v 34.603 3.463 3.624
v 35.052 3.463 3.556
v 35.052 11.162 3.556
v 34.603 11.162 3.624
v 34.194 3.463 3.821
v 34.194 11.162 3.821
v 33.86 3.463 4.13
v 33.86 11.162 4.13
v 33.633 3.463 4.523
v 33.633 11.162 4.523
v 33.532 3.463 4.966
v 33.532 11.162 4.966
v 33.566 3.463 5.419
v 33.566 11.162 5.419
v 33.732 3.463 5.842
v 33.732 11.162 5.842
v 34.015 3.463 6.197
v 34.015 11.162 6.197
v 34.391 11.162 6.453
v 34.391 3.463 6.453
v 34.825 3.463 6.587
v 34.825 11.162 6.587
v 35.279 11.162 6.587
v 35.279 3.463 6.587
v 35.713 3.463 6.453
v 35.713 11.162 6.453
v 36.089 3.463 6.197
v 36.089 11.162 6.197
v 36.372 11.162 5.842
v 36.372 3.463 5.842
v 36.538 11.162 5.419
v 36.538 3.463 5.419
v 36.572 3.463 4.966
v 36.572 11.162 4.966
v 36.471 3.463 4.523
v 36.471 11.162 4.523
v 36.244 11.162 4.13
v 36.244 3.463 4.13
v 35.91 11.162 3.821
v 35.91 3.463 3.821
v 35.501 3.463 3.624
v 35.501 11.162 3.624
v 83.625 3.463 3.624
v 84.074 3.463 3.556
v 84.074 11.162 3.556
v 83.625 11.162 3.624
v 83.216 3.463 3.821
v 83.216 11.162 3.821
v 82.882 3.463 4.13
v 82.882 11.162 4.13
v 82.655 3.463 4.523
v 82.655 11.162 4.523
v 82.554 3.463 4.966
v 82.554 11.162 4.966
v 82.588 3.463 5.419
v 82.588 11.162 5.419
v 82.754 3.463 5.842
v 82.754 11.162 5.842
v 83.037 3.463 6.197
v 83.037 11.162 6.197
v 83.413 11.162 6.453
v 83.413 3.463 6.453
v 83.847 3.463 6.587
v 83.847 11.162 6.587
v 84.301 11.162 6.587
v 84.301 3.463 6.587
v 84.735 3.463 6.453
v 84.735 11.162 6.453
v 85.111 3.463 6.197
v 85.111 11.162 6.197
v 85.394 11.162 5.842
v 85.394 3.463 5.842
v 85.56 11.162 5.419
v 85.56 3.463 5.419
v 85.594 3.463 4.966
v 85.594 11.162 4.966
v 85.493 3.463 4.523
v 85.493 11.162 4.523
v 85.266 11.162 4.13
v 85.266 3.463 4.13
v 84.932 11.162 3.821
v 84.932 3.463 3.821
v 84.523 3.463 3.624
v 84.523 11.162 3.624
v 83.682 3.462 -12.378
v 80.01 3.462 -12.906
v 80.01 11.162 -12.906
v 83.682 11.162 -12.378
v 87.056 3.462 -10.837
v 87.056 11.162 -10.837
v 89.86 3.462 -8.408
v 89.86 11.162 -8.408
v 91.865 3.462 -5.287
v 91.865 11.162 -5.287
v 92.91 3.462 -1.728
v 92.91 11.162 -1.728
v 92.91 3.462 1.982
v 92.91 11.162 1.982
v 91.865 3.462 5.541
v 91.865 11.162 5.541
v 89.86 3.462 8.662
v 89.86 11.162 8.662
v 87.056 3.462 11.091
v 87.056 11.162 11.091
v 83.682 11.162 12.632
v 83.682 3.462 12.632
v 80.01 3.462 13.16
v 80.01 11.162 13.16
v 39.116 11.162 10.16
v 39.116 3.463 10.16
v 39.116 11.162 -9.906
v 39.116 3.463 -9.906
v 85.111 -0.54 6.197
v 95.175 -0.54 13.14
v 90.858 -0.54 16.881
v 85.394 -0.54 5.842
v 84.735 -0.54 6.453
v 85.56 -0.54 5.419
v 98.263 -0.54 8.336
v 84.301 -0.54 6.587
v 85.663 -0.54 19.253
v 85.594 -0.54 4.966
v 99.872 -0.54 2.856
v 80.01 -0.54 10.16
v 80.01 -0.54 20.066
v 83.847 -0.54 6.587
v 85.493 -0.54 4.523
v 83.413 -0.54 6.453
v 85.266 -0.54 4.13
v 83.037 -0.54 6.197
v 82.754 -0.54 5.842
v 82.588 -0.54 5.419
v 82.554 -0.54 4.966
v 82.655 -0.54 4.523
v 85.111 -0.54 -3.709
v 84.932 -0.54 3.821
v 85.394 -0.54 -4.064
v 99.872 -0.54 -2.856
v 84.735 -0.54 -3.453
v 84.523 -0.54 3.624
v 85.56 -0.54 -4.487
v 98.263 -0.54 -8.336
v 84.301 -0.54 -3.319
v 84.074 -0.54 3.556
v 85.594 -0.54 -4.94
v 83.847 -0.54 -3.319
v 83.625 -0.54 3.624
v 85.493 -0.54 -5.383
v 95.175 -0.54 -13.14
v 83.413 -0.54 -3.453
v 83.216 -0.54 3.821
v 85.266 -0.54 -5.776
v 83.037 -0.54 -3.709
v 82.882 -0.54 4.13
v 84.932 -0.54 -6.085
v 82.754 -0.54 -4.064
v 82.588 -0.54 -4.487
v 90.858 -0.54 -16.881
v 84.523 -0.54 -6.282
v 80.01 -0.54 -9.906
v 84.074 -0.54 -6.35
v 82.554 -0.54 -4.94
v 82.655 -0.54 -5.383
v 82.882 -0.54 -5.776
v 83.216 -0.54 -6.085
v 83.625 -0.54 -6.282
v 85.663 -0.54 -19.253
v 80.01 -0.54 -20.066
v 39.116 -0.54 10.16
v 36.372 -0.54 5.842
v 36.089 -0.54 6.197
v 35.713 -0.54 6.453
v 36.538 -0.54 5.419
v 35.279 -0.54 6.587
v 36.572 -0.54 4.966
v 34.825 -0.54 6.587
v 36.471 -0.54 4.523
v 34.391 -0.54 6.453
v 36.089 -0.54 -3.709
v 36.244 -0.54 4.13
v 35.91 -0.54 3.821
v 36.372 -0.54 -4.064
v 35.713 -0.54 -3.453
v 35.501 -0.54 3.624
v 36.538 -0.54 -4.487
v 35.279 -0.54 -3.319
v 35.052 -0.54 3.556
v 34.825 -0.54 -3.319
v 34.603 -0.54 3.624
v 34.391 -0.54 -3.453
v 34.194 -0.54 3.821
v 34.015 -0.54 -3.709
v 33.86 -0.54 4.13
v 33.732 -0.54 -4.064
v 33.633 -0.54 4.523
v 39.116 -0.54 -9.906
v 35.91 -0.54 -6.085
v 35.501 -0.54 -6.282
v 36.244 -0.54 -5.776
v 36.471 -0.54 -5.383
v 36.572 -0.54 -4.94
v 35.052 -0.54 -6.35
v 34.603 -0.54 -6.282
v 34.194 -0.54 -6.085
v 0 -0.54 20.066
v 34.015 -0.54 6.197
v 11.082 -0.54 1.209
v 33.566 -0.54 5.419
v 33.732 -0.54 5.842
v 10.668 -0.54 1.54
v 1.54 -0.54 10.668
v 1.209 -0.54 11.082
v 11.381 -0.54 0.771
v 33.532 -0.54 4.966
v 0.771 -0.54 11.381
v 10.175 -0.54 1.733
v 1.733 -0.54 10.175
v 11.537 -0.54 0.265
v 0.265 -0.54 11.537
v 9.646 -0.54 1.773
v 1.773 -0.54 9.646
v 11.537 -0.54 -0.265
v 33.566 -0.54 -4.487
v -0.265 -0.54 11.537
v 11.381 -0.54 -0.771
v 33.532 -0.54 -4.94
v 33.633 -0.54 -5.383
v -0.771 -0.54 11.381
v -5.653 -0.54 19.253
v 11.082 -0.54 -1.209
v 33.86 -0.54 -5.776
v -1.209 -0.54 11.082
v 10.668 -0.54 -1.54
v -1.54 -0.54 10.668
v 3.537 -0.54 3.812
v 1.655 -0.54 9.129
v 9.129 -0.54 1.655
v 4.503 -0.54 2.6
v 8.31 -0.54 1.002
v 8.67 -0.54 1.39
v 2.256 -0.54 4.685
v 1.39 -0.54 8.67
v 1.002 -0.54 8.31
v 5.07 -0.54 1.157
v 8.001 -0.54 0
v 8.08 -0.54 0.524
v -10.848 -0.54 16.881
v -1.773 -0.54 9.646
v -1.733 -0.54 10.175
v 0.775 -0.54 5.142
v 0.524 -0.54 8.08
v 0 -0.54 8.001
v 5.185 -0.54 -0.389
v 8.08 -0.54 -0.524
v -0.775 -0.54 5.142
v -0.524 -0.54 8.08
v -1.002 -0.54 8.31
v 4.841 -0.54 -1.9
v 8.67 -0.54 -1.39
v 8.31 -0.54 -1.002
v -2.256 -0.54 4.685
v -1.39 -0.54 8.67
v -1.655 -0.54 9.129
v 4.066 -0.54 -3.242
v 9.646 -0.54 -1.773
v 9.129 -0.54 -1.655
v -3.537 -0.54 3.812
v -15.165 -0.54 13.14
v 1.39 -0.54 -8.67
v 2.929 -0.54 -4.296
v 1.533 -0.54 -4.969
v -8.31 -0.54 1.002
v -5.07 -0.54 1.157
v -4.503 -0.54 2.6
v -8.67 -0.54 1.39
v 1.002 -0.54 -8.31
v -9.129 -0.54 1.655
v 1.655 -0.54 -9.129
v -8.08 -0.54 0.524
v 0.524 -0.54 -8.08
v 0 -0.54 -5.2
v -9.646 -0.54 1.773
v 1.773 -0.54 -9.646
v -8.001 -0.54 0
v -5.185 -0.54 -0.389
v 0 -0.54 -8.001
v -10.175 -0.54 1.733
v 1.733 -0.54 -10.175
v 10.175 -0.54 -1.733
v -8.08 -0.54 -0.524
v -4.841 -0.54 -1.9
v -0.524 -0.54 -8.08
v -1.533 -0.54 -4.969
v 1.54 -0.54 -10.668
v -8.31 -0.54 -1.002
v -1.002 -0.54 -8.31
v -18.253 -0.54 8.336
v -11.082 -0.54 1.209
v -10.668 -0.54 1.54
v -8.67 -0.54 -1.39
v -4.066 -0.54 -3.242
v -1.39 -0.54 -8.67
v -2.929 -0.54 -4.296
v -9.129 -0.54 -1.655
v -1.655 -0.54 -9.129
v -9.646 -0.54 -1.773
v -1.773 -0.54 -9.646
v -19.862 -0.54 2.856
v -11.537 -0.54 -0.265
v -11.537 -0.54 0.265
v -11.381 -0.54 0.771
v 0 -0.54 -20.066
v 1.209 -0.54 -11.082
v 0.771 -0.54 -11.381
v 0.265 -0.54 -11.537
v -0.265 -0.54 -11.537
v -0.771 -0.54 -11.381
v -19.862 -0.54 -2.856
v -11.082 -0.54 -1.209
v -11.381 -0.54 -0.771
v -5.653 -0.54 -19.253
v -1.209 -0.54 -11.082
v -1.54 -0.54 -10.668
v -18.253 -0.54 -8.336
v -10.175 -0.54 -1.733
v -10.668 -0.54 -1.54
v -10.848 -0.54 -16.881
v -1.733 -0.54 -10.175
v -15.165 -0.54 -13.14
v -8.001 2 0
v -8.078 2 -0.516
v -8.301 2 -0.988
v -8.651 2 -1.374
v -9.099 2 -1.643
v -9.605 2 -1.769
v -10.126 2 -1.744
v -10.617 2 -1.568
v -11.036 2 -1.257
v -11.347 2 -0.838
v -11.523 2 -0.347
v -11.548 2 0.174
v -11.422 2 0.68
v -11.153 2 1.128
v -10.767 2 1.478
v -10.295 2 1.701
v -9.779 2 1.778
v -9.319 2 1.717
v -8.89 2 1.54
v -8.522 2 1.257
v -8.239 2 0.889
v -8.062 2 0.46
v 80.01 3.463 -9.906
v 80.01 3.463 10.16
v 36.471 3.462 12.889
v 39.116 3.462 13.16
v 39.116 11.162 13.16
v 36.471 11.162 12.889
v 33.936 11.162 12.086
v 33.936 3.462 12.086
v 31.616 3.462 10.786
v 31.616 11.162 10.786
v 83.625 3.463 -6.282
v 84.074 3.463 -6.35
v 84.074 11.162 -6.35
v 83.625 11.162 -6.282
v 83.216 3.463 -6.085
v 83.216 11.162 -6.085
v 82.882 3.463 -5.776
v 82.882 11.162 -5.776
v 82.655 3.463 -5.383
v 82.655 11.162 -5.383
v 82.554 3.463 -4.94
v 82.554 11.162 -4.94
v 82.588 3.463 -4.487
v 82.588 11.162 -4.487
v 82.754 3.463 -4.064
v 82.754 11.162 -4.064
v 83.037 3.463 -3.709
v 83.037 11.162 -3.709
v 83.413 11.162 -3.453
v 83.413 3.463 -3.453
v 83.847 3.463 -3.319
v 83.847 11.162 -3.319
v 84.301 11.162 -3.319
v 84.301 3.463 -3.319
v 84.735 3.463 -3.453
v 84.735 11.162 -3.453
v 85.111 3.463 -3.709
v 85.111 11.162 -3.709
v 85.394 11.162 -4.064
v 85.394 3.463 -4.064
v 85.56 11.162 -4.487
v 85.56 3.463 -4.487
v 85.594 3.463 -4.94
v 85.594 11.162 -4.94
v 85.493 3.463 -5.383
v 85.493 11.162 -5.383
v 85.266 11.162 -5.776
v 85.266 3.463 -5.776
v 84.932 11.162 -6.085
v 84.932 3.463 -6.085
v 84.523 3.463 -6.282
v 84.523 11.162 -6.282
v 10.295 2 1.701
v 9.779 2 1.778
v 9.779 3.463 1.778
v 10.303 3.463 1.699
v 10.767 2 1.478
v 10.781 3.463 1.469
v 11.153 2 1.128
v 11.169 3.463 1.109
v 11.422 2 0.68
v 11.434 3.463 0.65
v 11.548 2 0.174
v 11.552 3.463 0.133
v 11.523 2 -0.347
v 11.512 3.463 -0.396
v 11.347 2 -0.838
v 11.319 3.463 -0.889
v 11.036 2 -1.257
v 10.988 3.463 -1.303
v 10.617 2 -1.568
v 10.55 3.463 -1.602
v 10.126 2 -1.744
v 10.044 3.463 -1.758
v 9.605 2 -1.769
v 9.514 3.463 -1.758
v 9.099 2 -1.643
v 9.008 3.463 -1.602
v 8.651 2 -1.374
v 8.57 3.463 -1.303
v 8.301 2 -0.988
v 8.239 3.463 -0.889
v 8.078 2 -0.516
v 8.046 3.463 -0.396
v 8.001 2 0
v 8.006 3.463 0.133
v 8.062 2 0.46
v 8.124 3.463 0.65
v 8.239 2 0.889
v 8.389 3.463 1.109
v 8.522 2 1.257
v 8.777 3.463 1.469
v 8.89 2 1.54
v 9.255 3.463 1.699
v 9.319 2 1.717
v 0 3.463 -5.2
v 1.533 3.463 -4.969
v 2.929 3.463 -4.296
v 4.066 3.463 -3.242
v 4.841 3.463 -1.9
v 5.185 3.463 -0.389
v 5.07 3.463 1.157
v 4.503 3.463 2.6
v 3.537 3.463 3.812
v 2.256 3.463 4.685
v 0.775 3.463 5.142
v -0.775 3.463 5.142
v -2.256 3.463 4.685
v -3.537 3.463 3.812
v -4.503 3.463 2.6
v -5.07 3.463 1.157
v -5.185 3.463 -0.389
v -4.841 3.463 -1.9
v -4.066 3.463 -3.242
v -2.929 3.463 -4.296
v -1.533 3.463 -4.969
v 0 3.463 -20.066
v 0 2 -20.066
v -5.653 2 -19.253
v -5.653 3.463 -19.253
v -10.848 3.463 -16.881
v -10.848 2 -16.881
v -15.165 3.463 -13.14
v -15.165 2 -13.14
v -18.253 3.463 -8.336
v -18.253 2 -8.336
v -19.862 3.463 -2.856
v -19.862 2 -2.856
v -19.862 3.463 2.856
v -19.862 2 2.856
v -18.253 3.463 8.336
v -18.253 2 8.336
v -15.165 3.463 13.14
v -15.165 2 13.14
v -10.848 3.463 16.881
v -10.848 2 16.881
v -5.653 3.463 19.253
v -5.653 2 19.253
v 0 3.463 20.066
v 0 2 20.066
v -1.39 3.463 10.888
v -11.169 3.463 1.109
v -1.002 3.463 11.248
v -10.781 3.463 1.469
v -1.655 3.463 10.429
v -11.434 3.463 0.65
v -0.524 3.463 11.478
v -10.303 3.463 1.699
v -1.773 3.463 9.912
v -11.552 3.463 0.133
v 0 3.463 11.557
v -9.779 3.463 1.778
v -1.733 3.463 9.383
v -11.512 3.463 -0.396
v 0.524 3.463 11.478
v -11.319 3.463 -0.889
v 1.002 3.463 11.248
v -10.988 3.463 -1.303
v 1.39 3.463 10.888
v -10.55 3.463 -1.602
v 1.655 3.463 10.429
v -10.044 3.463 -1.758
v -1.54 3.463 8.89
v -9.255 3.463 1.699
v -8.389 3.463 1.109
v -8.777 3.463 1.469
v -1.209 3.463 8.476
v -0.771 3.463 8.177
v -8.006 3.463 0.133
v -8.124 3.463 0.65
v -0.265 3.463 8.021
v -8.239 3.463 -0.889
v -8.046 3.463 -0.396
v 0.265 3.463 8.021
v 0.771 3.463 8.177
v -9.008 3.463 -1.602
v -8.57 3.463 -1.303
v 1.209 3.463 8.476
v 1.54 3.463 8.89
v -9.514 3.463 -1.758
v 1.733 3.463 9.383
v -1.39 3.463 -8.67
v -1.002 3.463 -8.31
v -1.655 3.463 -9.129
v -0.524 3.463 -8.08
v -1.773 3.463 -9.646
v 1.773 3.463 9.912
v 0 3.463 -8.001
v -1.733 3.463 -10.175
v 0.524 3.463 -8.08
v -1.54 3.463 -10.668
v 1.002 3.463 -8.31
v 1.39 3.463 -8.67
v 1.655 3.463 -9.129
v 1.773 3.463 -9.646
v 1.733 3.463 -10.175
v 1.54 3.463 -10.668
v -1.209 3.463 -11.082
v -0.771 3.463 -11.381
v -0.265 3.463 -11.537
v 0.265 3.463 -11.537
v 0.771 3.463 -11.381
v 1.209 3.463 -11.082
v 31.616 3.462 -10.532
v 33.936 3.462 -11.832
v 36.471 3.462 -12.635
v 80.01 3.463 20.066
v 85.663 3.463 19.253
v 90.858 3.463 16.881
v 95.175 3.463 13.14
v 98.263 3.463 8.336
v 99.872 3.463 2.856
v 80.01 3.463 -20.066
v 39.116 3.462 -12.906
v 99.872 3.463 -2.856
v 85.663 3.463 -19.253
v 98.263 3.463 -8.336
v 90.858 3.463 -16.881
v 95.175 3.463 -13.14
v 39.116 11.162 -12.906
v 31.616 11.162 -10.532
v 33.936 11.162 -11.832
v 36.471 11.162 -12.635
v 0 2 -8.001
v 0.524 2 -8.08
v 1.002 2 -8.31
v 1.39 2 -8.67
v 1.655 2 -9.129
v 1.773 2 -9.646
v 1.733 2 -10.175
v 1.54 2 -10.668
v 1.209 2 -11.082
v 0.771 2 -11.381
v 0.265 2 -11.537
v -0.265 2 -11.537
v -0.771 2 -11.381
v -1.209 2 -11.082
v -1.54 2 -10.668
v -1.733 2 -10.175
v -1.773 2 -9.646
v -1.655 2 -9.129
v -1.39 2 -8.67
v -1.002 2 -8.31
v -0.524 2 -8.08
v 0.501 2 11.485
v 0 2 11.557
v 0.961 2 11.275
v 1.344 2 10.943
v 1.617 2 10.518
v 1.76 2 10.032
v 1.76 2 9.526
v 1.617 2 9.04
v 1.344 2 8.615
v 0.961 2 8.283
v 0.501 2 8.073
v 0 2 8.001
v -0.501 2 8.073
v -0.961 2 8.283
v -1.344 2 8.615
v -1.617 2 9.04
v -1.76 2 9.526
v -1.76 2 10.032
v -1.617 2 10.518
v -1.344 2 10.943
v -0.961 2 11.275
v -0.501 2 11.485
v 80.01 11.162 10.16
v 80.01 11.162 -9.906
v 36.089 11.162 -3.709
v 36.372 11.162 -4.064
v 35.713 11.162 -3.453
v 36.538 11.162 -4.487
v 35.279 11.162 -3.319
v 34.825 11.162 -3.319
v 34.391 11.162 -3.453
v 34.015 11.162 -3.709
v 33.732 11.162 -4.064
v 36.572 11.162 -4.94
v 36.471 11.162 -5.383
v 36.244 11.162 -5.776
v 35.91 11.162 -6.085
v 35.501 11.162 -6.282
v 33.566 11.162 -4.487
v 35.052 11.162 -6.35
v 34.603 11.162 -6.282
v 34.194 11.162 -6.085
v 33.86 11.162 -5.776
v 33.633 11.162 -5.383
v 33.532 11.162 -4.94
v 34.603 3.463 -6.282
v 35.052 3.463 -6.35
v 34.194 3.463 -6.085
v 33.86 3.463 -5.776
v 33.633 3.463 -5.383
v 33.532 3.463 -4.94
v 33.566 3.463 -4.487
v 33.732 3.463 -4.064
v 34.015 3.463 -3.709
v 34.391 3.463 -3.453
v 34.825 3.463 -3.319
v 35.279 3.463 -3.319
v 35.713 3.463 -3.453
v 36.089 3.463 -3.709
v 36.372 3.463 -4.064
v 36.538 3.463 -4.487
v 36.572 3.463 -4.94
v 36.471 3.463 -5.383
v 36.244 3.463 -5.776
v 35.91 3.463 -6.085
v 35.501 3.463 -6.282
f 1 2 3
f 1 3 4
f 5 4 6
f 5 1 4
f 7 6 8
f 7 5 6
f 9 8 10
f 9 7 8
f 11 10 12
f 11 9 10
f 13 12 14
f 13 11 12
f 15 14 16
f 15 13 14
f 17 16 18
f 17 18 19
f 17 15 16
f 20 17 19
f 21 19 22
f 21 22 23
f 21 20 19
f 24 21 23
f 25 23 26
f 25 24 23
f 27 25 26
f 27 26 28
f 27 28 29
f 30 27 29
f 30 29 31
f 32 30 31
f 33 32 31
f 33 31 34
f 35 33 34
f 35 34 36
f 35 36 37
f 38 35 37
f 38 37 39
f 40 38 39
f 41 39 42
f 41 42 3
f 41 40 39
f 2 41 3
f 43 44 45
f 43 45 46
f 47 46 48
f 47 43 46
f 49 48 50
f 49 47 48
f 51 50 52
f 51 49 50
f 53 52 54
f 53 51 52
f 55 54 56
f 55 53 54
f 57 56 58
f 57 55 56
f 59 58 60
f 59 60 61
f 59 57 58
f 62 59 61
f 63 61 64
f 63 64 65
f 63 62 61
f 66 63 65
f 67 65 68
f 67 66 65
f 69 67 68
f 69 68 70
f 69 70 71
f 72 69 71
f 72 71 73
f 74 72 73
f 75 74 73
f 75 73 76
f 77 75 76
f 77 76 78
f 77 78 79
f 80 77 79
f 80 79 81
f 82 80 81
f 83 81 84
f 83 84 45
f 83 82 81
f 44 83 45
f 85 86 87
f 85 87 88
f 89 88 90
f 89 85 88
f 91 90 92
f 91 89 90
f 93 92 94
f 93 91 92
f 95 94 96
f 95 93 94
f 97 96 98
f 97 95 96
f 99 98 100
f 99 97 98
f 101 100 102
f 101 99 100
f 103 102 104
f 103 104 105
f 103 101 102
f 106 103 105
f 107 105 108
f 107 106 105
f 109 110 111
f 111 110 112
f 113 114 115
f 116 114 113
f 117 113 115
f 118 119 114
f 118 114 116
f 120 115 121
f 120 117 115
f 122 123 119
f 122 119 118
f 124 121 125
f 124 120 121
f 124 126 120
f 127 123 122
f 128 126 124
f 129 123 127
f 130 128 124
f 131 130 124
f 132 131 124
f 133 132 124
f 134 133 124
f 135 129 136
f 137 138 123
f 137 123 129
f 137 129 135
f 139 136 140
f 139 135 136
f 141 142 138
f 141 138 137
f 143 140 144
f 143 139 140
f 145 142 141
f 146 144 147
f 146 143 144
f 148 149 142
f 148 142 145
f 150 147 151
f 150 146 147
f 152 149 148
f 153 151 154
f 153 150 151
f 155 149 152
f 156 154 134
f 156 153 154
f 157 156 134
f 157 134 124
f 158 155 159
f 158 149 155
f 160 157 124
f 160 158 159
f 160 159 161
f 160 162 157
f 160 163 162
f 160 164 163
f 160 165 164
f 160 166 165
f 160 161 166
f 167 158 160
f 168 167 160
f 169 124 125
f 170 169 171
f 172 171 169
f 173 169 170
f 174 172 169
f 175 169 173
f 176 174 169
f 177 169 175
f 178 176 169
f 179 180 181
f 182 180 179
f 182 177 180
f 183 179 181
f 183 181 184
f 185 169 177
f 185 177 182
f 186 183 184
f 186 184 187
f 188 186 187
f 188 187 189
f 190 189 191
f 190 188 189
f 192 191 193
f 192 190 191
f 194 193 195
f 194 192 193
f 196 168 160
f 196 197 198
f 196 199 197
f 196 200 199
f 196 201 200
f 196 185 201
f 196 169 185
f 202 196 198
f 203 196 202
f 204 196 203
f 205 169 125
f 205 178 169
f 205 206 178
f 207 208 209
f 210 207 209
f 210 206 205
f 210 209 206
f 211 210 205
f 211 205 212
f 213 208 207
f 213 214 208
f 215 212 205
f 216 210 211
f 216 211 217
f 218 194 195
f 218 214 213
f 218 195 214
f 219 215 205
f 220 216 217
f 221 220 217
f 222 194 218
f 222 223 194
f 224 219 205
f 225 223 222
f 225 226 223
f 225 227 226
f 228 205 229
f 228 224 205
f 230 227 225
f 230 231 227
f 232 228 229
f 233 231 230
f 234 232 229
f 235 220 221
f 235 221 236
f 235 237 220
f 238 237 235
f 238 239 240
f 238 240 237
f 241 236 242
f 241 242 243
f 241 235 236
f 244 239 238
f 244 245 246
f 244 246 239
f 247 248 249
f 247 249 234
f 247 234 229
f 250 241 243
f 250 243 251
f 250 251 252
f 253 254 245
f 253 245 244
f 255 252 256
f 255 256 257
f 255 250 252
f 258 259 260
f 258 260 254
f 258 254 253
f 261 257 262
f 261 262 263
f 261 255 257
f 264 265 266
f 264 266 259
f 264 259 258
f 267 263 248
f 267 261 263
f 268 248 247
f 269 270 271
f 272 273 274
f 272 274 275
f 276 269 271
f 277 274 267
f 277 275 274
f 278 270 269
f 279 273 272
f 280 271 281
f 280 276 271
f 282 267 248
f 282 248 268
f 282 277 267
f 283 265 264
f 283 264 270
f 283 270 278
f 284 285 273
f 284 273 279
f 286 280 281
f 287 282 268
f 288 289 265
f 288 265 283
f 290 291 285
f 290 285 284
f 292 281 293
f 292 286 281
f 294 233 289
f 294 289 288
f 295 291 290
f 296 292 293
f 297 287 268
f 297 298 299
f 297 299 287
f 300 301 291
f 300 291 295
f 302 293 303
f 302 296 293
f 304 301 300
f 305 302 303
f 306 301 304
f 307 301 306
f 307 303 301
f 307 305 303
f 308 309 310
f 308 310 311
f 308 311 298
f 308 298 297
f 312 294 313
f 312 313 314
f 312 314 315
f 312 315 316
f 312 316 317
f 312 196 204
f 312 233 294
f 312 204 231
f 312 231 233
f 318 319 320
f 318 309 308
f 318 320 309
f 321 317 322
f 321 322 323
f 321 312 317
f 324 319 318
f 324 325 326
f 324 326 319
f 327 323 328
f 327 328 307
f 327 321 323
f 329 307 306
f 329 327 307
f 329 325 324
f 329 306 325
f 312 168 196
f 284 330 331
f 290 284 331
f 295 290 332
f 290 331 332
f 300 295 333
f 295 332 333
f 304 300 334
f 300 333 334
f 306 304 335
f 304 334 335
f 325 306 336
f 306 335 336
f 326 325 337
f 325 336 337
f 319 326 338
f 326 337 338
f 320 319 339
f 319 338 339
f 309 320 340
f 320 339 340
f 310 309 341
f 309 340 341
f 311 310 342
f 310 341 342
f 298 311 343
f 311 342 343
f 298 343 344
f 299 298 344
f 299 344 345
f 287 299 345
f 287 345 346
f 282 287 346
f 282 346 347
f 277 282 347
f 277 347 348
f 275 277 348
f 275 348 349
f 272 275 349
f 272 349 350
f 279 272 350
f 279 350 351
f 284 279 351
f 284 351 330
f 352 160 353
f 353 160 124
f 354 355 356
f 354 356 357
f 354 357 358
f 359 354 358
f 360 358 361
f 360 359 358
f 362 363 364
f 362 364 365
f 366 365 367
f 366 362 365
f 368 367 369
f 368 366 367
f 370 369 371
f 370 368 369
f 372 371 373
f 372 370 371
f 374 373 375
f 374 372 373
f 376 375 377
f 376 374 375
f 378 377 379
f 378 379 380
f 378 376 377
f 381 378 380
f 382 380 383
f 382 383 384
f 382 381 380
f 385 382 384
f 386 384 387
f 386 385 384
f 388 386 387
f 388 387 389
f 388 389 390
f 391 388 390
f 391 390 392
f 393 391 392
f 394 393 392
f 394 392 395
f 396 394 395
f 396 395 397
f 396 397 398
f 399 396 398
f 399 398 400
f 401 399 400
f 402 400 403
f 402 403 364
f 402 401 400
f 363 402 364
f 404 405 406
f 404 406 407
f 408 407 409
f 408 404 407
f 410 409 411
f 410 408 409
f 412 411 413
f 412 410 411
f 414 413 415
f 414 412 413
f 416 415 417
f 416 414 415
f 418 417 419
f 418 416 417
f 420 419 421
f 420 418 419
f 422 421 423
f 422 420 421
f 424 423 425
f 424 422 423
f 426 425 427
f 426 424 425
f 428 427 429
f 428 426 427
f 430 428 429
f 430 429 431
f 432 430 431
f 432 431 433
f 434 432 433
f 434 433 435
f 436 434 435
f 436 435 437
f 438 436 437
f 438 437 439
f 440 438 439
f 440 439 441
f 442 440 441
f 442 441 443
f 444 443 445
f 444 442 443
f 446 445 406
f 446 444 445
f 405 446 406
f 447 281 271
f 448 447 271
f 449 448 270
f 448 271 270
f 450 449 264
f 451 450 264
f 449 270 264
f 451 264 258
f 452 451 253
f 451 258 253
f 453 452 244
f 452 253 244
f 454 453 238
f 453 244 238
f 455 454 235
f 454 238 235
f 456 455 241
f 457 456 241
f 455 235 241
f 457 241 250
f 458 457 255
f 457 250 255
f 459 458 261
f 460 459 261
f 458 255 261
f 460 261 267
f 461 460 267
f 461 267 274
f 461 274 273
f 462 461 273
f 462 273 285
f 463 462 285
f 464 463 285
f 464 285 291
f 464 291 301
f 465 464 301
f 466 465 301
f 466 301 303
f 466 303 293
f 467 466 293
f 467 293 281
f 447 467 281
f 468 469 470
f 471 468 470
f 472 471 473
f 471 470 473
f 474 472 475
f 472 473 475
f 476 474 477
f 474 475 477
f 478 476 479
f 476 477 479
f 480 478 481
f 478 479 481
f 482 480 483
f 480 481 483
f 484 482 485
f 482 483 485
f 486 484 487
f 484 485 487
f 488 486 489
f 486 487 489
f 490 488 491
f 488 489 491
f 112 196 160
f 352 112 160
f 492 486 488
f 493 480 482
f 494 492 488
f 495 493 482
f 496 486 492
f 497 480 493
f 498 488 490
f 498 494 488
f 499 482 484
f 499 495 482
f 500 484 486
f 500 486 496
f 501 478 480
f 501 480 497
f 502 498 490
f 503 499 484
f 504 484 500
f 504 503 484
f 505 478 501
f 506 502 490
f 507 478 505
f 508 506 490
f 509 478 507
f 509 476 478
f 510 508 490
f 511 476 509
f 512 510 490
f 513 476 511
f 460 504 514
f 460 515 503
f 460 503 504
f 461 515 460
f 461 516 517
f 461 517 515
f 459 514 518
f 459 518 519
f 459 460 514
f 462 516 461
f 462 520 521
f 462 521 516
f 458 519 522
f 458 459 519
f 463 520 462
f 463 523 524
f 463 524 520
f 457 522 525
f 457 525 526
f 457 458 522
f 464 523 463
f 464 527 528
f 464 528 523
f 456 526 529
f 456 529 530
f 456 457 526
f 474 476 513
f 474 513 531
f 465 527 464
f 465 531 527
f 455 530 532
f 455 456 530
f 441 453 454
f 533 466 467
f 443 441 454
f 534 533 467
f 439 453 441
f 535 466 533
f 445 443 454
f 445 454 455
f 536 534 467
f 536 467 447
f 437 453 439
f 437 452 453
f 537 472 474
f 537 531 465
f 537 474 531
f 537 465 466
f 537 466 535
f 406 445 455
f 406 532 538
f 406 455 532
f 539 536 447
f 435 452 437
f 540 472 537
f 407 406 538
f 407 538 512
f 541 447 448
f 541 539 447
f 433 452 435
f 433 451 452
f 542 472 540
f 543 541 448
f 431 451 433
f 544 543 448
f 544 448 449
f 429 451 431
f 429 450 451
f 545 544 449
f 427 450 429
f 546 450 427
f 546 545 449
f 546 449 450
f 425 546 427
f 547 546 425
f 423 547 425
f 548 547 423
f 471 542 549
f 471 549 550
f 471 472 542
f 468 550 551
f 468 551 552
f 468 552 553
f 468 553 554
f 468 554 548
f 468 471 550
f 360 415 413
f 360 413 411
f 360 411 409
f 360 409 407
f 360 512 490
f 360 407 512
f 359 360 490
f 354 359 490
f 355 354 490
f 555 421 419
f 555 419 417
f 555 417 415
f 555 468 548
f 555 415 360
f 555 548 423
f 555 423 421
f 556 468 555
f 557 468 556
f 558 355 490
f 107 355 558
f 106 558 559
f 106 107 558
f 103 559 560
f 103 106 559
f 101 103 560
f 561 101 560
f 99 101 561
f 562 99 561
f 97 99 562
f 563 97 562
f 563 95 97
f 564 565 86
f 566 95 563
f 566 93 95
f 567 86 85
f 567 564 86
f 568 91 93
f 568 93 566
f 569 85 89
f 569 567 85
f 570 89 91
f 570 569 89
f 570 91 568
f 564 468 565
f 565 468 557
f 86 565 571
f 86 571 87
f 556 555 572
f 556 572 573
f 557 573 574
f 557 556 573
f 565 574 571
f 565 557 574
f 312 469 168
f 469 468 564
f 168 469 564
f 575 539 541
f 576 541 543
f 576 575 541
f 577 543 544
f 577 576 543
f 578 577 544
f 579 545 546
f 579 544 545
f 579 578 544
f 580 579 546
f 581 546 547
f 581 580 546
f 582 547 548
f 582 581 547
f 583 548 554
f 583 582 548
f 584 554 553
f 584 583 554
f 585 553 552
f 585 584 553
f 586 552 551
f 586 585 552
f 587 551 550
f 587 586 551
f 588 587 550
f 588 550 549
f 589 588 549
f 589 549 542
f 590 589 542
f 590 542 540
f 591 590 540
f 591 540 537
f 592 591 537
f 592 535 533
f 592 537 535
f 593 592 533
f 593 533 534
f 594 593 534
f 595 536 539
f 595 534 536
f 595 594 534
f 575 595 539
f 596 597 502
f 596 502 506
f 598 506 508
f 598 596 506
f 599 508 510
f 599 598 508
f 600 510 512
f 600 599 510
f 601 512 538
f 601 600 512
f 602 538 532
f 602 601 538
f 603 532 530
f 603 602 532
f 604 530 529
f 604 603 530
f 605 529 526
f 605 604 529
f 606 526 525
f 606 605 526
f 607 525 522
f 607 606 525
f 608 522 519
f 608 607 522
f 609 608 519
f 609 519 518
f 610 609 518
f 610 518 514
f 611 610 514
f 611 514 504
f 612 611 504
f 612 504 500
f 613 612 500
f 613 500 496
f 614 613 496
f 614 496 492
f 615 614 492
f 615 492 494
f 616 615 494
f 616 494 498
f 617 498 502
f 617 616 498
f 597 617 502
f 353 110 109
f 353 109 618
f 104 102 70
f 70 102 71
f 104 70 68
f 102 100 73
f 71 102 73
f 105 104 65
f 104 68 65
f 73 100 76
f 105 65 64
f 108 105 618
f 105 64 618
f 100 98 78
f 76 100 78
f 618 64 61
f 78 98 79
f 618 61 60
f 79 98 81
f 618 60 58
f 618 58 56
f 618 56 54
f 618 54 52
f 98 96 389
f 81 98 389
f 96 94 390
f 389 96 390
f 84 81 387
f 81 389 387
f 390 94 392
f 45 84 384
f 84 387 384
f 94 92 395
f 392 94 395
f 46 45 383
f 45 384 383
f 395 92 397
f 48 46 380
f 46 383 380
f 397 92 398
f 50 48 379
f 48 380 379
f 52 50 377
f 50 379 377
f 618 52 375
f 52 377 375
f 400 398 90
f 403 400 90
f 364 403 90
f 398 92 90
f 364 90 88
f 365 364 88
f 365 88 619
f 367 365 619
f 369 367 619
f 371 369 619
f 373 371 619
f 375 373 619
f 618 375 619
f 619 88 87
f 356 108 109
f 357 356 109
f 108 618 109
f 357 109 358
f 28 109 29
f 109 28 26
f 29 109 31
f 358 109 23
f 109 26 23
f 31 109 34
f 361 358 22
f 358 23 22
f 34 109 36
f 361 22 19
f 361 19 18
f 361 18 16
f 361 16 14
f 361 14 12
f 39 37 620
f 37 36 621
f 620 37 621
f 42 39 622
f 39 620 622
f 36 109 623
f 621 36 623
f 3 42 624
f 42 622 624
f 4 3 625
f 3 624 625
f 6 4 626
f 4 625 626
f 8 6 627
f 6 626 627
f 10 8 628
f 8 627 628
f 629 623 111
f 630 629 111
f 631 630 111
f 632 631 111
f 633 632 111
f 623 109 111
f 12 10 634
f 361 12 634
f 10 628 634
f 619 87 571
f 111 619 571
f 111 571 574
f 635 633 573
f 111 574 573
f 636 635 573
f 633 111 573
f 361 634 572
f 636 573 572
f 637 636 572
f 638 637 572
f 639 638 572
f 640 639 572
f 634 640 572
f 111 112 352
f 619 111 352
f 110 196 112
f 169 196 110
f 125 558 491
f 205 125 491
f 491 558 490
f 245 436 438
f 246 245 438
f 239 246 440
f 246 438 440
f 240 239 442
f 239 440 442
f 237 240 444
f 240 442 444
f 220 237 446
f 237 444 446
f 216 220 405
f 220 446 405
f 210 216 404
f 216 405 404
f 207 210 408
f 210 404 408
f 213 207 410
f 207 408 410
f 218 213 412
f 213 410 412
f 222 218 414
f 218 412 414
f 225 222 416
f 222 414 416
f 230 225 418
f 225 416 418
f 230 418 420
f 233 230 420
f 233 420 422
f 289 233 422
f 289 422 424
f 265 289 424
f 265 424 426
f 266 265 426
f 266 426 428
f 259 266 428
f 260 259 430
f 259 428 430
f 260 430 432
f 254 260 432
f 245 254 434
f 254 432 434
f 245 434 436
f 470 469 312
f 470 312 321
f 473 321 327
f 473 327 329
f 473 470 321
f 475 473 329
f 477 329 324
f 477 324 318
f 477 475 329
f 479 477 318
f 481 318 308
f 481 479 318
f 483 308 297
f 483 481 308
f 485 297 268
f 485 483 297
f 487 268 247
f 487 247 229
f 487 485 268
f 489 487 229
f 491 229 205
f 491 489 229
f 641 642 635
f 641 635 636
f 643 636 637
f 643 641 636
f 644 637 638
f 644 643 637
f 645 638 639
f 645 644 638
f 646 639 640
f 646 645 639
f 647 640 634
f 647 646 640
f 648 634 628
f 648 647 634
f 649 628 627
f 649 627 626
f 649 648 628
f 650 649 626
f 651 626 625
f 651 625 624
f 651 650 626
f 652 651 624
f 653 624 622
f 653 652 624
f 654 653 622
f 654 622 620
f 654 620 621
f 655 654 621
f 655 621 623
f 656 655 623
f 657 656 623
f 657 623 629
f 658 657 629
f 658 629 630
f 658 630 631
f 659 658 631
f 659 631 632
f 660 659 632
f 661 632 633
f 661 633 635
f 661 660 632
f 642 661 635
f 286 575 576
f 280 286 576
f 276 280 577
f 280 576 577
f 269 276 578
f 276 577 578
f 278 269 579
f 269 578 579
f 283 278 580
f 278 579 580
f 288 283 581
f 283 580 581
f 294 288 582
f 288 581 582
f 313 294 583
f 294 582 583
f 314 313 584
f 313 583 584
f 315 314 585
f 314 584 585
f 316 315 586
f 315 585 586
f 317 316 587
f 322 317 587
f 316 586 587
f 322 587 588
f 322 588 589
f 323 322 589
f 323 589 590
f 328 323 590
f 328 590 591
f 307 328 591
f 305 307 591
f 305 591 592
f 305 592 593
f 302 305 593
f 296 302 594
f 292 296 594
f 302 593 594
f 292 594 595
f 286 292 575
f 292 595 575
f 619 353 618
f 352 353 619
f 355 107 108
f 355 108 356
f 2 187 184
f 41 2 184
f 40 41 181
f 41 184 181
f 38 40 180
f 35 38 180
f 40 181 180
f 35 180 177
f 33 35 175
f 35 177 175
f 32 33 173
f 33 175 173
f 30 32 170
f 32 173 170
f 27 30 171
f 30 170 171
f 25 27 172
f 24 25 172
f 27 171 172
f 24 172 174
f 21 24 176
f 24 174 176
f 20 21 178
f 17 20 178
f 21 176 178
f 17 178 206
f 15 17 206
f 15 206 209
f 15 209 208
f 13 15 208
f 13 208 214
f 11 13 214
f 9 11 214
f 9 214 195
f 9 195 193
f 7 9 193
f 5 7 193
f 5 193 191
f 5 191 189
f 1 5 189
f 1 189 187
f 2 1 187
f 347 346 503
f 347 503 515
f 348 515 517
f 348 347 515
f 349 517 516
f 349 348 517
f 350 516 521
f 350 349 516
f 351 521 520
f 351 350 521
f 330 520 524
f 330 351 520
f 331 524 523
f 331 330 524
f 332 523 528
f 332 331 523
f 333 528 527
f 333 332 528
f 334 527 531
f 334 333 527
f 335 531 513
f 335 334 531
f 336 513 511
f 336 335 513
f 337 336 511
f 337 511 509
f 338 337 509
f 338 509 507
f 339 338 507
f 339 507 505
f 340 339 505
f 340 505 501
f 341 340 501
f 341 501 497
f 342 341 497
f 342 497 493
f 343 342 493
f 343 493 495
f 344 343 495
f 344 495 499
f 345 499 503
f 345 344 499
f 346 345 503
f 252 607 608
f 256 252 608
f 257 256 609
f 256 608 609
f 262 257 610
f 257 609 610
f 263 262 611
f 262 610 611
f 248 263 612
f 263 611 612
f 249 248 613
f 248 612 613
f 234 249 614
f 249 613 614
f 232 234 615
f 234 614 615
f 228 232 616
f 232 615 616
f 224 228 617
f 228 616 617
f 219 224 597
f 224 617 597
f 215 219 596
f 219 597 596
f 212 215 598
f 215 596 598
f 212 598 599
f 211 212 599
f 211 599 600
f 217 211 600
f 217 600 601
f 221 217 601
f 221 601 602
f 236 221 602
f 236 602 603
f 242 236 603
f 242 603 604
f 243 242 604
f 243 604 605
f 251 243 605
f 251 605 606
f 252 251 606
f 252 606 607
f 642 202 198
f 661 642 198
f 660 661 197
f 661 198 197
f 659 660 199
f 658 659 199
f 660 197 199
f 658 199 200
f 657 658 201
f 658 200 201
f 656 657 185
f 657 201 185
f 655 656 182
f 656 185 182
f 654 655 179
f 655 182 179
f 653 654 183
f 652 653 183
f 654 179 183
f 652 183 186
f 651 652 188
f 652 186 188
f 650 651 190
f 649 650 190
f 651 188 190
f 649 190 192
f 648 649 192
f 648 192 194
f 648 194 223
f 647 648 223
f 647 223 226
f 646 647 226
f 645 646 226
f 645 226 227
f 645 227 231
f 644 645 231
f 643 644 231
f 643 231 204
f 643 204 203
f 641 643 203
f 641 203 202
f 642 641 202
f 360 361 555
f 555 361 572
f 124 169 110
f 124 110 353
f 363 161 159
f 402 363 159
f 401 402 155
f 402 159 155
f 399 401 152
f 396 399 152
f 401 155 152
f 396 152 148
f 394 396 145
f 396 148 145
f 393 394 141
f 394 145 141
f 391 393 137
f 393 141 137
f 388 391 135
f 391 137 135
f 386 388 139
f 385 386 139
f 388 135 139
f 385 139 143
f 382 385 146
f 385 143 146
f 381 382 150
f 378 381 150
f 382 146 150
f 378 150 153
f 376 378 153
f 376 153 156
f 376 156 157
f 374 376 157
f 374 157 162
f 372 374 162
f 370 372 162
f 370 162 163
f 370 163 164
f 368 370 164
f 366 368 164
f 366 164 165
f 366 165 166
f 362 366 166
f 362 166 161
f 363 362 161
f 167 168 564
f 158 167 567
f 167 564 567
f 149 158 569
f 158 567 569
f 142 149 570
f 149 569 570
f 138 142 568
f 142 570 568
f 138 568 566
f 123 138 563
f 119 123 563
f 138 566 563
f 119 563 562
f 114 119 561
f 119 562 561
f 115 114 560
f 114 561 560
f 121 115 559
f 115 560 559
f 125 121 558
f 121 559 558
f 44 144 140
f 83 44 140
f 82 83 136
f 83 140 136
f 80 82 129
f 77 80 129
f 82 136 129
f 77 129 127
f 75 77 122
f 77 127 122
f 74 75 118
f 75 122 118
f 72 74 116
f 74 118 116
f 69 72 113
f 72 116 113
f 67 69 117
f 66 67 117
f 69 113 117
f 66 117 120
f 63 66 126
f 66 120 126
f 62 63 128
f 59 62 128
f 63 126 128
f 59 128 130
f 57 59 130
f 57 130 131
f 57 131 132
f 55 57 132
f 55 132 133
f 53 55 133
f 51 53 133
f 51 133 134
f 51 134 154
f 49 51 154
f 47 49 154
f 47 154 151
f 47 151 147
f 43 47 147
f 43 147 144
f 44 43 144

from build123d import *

# Parameters (mm, degrees)
SKETCH1_R               = 0.5
SKETCH1_R_2             = 1.375
BOSS_EXTRUDE1_DEPTH     = 2
SKETCH4_R               = 4.6270037
SKETCH4_R_2             = 2.6270037
BOSS_EXTRUDE3_DEPTH     = 2.5
CUT_EXTRUDE3_DEPTH      = 2.5
SKETCH6_R               = 20.066
SKETCH6_R_2             = 3.75
BOSS_EXTRUDE6_DEPTH     = 2.54
SKETCH7_R               = 1.778
CUT_EXTRUDE4_DEPTH      = 2.54
CIRPATTERN1_COUNT       = 4
BOSS_EXTRU_1_DEPTH      = 2.2225
BOSS_EXTRU_1_DEPTH_BACK = 2.54
ESQUISSE3_R             = 20.066
ESQUISSE3_R_2           = 1.778
ESQUISSE3_R_3           = 1.375
BOSS_EXTRU_2_DEPTH      = 2.2225
ENL_V_MAT_EXTRU_1_REACH = 104.179
ESQUISSE4_W             = 40.894
ESQUISSE4_H             = 20.066
ESQUISSE5_R             = 1.524
ENL_V_MAT_EXTRU_2_DEPTH = 103.178919246
ESQUISSE6_W             = 129.807809177
ESQUISSE6_H             = 84.506546368
ENL_V_MAT_EXTRU_3_DEPTH = 0.76
ESQUISSE7_R             = 5.2
ENL_V_MAT_EXTRU_4_DEPTH = 103.241877615
ESQUISSE8_R             = 1.524
ESQUISSE8_W             = 40.894
ESQUISSE8_H             = 20.066
BOSS_EXTRU_3_DEPTH      = 7.7
ESQUISSE9_W             = 7.452608866
ESQUISSE9_H             = 26.066
ENL_V_MAT_EXTRU_5_DEPTH = 7.7


with BuildPart() as part:
    # Sketch1 → Boss-Extrude1 (new body)
    with BuildSketch(Plane(origin=(0, 0, 0), x_dir=(1, 0, 0), z_dir=(0, 1, 0))):
        with BuildLine():
            Line((-4, 4), (-2.467435953, 13.402193757))
            ThreePointArc((-2.467435953, 13.402193757), (0, 15.5), (2.467435953, 13.402193757))
            Line((2.467435953, 13.402193757), (4, 4))
            Line((4, 4), (12.448472752, 2.459445505))
            ThreePointArc((12.448472752, 2.459445505), (14.5, 0), (12.448472752, -2.459445505))
            Line((12.448472752, -2.459445505), (4, -4))
            Line((4, -4), (2.467435953, -13.402193757))
            ThreePointArc((2.467435953, -13.402193757), (0, -15.5), (-2.467435953, -13.402193757))
            Line((-2.467435953, -13.402193757), (-4, -4))
            Line((-4, -4), (-12.448472752, -2.459445505))
            ThreePointArc((-12.448472752, -2.459445505), (-14.5, 0), (-12.448472752, 2.459445505))
            Line((-12.448472752, 2.459445505), (-4, 4))
        make_face()
        with Locations(Location((0, 12, 0), (0, 0, 270))):
            Circle(SKETCH1_R, mode=Mode.SUBTRACT)
        with Locations(Location((0, 9.5, 0), (0, 0, 270))):
            Circle(SKETCH1_R, mode=Mode.SUBTRACT)
        with Locations(Location((0, 7.5, 0), (0, 0, 270))):
            Circle(SKETCH1_R, mode=Mode.SUBTRACT)
        with Locations(Location((12, 0, 0), (0, 0, 270))):
            Circle(SKETCH1_R, mode=Mode.SUBTRACT)
        with Locations(Location((9.5, 0, 0), (0, 0, 270))):
            Circle(SKETCH1_R, mode=Mode.SUBTRACT)
        with Locations(Location((7.5, 0, 0), (0, 0, 270))):
            Circle(SKETCH1_R, mode=Mode.SUBTRACT)
        with Locations(Location((0, -12, 0), (0, 0, 270))):
            Circle(SKETCH1_R, mode=Mode.SUBTRACT)
        with Locations(Location((0, -9.5, 0), (0, 0, 270))):
            Circle(SKETCH1_R, mode=Mode.SUBTRACT)
        with Locations(Location((0, -7.5, 0), (0, 0, 270))):
            Circle(SKETCH1_R, mode=Mode.SUBTRACT)
        with Locations(Location((-12, 0, 0), (0, 0, 270))):
            Circle(SKETCH1_R, mode=Mode.SUBTRACT)
        with Locations(Location((-9.5, 0, 0), (0, 0, 270))):
            Circle(SKETCH1_R, mode=Mode.SUBTRACT)
        with Locations(Location((-7.5, 0, 0), (0, 0, 270))):
            Circle(SKETCH1_R, mode=Mode.SUBTRACT)
        with Locations(Location((0, 0, 0), (0, 0, 270))):
            Circle(SKETCH1_R_2, mode=Mode.SUBTRACT)
    extrude(amount=BOSS_EXTRUDE1_DEPTH)

    # Sketch4 → Boss-Extrude3 (add)
    with BuildSketch(Plane.XZ):
        with Locations(Location((0, 0, 0), (0, 0, 90))):
            Circle(SKETCH4_R)
        with Locations(Location((0, 0, 0), (0, 0, 270))):
            Circle(SKETCH4_R_2, mode=Mode.SUBTRACT)
    extrude(amount=BOSS_EXTRUDE3_DEPTH)

    # Sketch5 → Cut-Extrude3 (cut)
    with BuildSketch(Plane.XZ.offset(2.5)):
        with BuildLine():
            Line((0.282820055, 2.611735296), (0, 3.101594))
            Line((0, 3.101594), (-0.282820055, 2.611735296))
            ThreePointArc((-0.282820055, 2.611735296), (-0.410953918, 2.594660925), (-0.538092735, 2.571304075))
            Line((-0.538092735, 2.571304075), (-0.958445256, 2.949791185))
            Line((-0.958445256, 2.949791185), (-1.076048447, 2.396511669))
            ThreePointArc((-1.076048447, 2.396511669), (-1.192634723, 2.340677436), (-1.306333259, 2.279175696))
            Line((-1.306333259, 2.279175696), (-1.823071212, 2.509242256))
            Line((-1.823071212, 2.509242256), (-1.76394572, 1.946700782))
            ThreePointArc((-1.76394572, 1.946700782), (-1.85757213, 1.85757213), (-1.946700782, 1.76394572))
            Line((-1.946700782, 1.76394572), (-2.509242256, 1.823071212))
            Line((-2.509242256, 1.823071212), (-2.279175696, 1.306333259))
            ThreePointArc((-2.279175696, 1.306333259), (-2.340677436, 1.192634723), (-2.396511669, 1.076048447))
            Line((-2.396511669, 1.076048447), (-2.949791185, 0.958445256))
            Line((-2.949791185, 0.958445256), (-2.571304075, 0.538092735))
            ThreePointArc((-2.571304075, 0.538092735), (-2.594660925, 0.410953918), (-2.611735296, 0.282820055))
            Line((-2.611735296, 0.282820055), (-3.101594, 0))
            Line((-3.101594, 0), (-2.611735296, -0.282820055))
            ThreePointArc((-2.611735296, -0.282820055), (-2.594660925, -0.410953918), (-2.571304075, -0.538092735))
            Line((-2.571304075, -0.538092735), (-2.949791185, -0.958445256))
            Line((-2.949791185, -0.958445256), (-2.396511669, -1.076048447))
            ThreePointArc((-2.396511669, -1.076048447), (-2.340677436, -1.192634723), (-2.279175696, -1.306333259))
            Line((-2.279175696, -1.306333259), (-2.509242256, -1.823071212))
            Line((-2.509242256, -1.823071212), (-1.946700782, -1.76394572))
            ThreePointArc((-1.946700782, -1.76394572), (-1.85757213, -1.85757213), (-1.76394572, -1.946700782))
            Line((-1.76394572, -1.946700782), (-1.823071212, -2.509242256))
            Line((-1.823071212, -2.509242256), (-1.306333259, -2.279175696))
            ThreePointArc((-1.306333259, -2.279175696), (-1.192634723, -2.340677436), (-1.076048447, -2.396511669))
            Line((-1.076048447, -2.396511669), (-0.958445256, -2.949791185))
            Line((-0.958445256, -2.949791185), (-0.538092735, -2.571304075))
            ThreePointArc((-0.538092735, -2.571304075), (-0.410953918, -2.594660925), (-0.282820055, -2.611735296))
            Line((-0.282820055, -2.611735296), (0, -3.101594))
            Line((0, -3.101594), (0.282820055, -2.611735296))
            ThreePointArc((0.282820055, -2.611735296), (0.410953918, -2.594660925), (0.538092735, -2.571304075))
            Line((0.538092735, -2.571304075), (0.958445256, -2.949791185))
            Line((0.958445256, -2.949791185), (1.076048447, -2.396511669))
            ThreePointArc((1.076048447, -2.396511669), (1.192634723, -2.340677436), (1.306333259, -2.279175696))
            Line((1.306333259, -2.279175696), (1.823071212, -2.509242256))
            Line((1.823071212, -2.509242256), (1.76394572, -1.946700782))
            ThreePointArc((1.76394572, -1.946700782), (1.85757213, -1.85757213), (1.946700782, -1.76394572))
            Line((1.946700782, -1.76394572), (2.509242256, -1.823071212))
            Line((2.509242256, -1.823071212), (2.279175696, -1.306333259))
            ThreePointArc((2.279175696, -1.306333259), (2.340677436, -1.192634723), (2.396511669, -1.076048447))
            Line((2.396511669, -1.076048447), (2.949791185, -0.958445256))
            Line((2.949791185, -0.958445256), (2.571304075, -0.538092735))
            ThreePointArc((2.571304075, -0.538092735), (2.594660925, -0.410953918), (2.611735296, -0.282820055))
            Line((2.611735296, -0.282820055), (3.101594, 0))
            Line((3.101594, 0), (2.611735296, 0.282820055))
            ThreePointArc((2.611735296, 0.282820055), (2.594660925, 0.410953918), (2.571304075, 0.538092735))
            Line((2.571304075, 0.538092735), (2.949791185, 0.958445256))
            Line((2.949791185, 0.958445256), (2.396511669, 1.076048447))
            ThreePointArc((2.396511669, 1.076048447), (2.340677436, 1.192634723), (2.279175696, 1.306333259))
            Line((2.279175696, 1.306333259), (2.509242256, 1.823071212))
            Line((2.509242256, 1.823071212), (1.946700782, 1.76394572))
            ThreePointArc((1.946700782, 1.76394572), (1.85757213, 1.85757213), (1.76394572, 1.946700782))
            Line((1.76394572, 1.946700782), (1.823071212, 2.509242256))
            Line((1.823071212, 2.509242256), (1.306333259, 2.279175696))
            ThreePointArc((1.306333259, 2.279175696), (1.192634723, 2.340677436), (1.076048447, 2.396511669))
            Line((1.076048447, 2.396511669), (0.958445256, 2.949791185))
            Line((0.958445256, 2.949791185), (0.538092735, 2.571304075))
            ThreePointArc((0.538092735, 2.571304075), (0.410953918, 2.594660925), (0.282820055, 2.611735296))
        make_face()
    extrude(amount=-CUT_EXTRUDE3_DEPTH, mode=Mode.SUBTRACT)

    # Sketch6 → Boss-Extrude6 (add)
    with BuildSketch(Plane(origin=(0, 2, 0), x_dir=(1, 0, 0), z_dir=(0, 1, 0))):
        with Locations(Location((0, 0, 0), (0, 0, 270))):
            Circle(SKETCH6_R)
        Circle(SKETCH6_R_2, mode=Mode.SUBTRACT)
    extrude(amount=-BOSS_EXTRUDE6_DEPTH)

    # Sketch7 → Cut-Extrude4 (cut)
    with BuildSketch(Plane(origin=(0, 2, 0), x_dir=(1, 0, 0), z_dir=(0, 1, 0))):
        with Locations(Location((0, 9.779, 0), (0, 0, 270))):
            Circle(SKETCH7_R)
    cut_extrude4 = extrude(amount=-CUT_EXTRUDE4_DEPTH, mode=Mode.SUBTRACT)

    # CirPattern1: Cut-Extrude4 ×4 about axis
    cirpattern1_axis = Axis((0, 0, 0), (0, 1, 0))
    for i in range(1, CIRPATTERN1_COUNT):
        add(cut_extrude4.rotate(cirpattern1_axis, i * 360 / CIRPATTERN1_COUNT), mode=Mode.SUBTRACT)

    # Esquisse1 → Boss.-Extru.1 (add, two sides)
    with BuildSketch(Plane(origin=(0, 2, 0), x_dir=(1, 0, 0), z_dir=(0, 1, 0))) as boss_extru_1_sk:
        with BuildLine():
            Line((0, 20.066), (80.01, 20.066))
            ThreePointArc((80.01, 20.066), (100.076, 0), (80.01, -20.066))
            Line((80.01, -20.066), (0, -20.066))
            ThreePointArc((0, -20.066), (20.066, 0), (0, 20.066))
        make_face()
    extrude(amount=BOSS_EXTRU_1_DEPTH)
    extrude(boss_extru_1_sk.sketch, amount=-BOSS_EXTRU_1_DEPTH_BACK)

    # Esquisse3 → Boss.-Extru.2 (add)
    with BuildSketch(Plane(origin=(0, 2, 0), x_dir=(1, 0, 0), z_dir=(0, 1, 0))):
        Circle(ESQUISSE3_R)
        with Locations(Location((9.779, 0, 0), (0, 0, 270))):
            Circle(ESQUISSE3_R_2, mode=Mode.SUBTRACT)
        with Locations(Location((0, 9.779, 0), (0, 0, 270))):
            Circle(ESQUISSE3_R_2, mode=Mode.SUBTRACT)
        with Locations(Location((-9.779, 0, 0), (0, 0, 270))):
            Circle(ESQUISSE3_R_2, mode=Mode.SUBTRACT)
        with Locations(Location((0, -9.779, 0), (0, 0, 270))):
            Circle(ESQUISSE3_R_2, mode=Mode.SUBTRACT)
        with Locations(Location((0, 0, 0), (0, 0, 270))):
            Circle(ESQUISSE3_R_3, mode=Mode.SUBTRACT)
    extrude(amount=BOSS_EXTRU_2_DEPTH)

    # Esquisse4 → Enlèv. mat.-Extru.1 (cut, up to next)
    with BuildSketch(Plane.XZ.offset(0.54), mode=Mode.PRIVATE) as enl_v_mat_extru_1_sk1:
        with Locations((59.563, 0.127)):
            Rectangle(ESQUISSE4_W, ESQUISSE4_H)
    enl_v_mat_extru_1_tool1 = extrude(enl_v_mat_extru_1_sk1.sketch, amount=-ENL_V_MAT_EXTRU_1_REACH, mode=Mode.PRIVATE) & part.part
    add(enl_v_mat_extru_1_tool1.solids().sort_by_distance((59.563, -0.54, 0.127))[0], mode=Mode.SUBTRACT)

    # Esquisse5 → Enlèv. mat.-Extru.2 (cut, through all)
    with BuildSketch(Plane(origin=(0, -0.54, 0), x_dir=(-1, 0, 0), z_dir=(0, -1, 0))):
        with Locations(Location((-35.052, -5.08, 0), (0, 0, 90))):
            Circle(ESQUISSE5_R)
        with Locations(Location((-35.052, 4.826, 0), (0, 0, 90))):
            Circle(ESQUISSE5_R)
        with Locations(Location((-84.074, -5.08, 0), (0, 0, 90))):
            Circle(ESQUISSE5_R)
        with Locations(Location((-84.074, 4.826, 0), (0, 0, 90))):
            Circle(ESQUISSE5_R)
    extrude(amount=-ENL_V_MAT_EXTRU_2_DEPTH, mode=Mode.SUBTRACT)

    # Esquisse6 → Enlèv. mat.-Extru.3 (cut)
    with BuildSketch(Plane(origin=(0, 4.2225, 0), x_dir=(1, 0, 0), z_dir=(0, 1, 0))):
        with Locations((40.86254749, 2.128524174)):
            Rectangle(ESQUISSE6_W, ESQUISSE6_H)
    extrude(amount=-ENL_V_MAT_EXTRU_3_DEPTH, mode=Mode.SUBTRACT)

    # Esquisse7 → Enlèv. mat.-Extru.4 (cut, through all)
    with BuildSketch(Plane(origin=(0, -2.5, 0), x_dir=(-1, 0, 0), z_dir=(0, -1, 0))):
        with Locations(Location((0, 0, 0), (0, 0, 90))):
            Circle(ESQUISSE7_R)
    extrude(amount=-ENL_V_MAT_EXTRU_4_DEPTH, mode=Mode.SUBTRACT)

    # Esquisse8 → Boss.-Extru.3 (add)
    with BuildSketch(Plane(origin=(0, 3.4625, 0), x_dir=(1, 0, 0), z_dir=(0, 1, 0))):
        with BuildLine():
            Line((80.01, -13.16), (39.116, -13.16))
            ThreePointArc((39.116, -13.16), (26.083, -0.127), (39.116, 12.906))
            Line((39.116, 12.906), (80.01, 12.906))
            ThreePointArc((80.01, 12.906), (93.043, -0.127), (80.01, -13.16))
        make_face()
        with Locations(Location((84.074, -5.08, 0), (0, 0, 90))):
            Circle(ESQUISSE8_R, mode=Mode.SUBTRACT)
        with Locations(Location((84.074, 4.826, 0), (0, 0, 90))):
            Circle(ESQUISSE8_R, mode=Mode.SUBTRACT)
        with Locations(Location((35.052, -5.08, 0), (0, 0, 90))):
            Circle(ESQUISSE8_R, mode=Mode.SUBTRACT)
        with Locations(Location((35.052, 4.826, 0), (0, 0, 90))):
            Circle(ESQUISSE8_R, mode=Mode.SUBTRACT)
        with Locations((59.563, -0.127)):
            Rectangle(ESQUISSE8_W, ESQUISSE8_H, mode=Mode.SUBTRACT)
    extrude(amount=BOSS_EXTRU_3_DEPTH)

    # Esquisse9 → Enlèv. mat.-Extru.5 (cut)
    with BuildSketch(Plane(origin=(0, 11.1625, 0), x_dir=(1, 0, 0), z_dir=(0, 1, 0))):
        with Locations((27.889695567, -0.127)):
            Rectangle(ESQUISSE9_W, ESQUISSE9_H)
    extrude(amount=-ENL_V_MAT_EXTRU_5_DEPTH, mode=Mode.SUBTRACT)


solid = part.part
